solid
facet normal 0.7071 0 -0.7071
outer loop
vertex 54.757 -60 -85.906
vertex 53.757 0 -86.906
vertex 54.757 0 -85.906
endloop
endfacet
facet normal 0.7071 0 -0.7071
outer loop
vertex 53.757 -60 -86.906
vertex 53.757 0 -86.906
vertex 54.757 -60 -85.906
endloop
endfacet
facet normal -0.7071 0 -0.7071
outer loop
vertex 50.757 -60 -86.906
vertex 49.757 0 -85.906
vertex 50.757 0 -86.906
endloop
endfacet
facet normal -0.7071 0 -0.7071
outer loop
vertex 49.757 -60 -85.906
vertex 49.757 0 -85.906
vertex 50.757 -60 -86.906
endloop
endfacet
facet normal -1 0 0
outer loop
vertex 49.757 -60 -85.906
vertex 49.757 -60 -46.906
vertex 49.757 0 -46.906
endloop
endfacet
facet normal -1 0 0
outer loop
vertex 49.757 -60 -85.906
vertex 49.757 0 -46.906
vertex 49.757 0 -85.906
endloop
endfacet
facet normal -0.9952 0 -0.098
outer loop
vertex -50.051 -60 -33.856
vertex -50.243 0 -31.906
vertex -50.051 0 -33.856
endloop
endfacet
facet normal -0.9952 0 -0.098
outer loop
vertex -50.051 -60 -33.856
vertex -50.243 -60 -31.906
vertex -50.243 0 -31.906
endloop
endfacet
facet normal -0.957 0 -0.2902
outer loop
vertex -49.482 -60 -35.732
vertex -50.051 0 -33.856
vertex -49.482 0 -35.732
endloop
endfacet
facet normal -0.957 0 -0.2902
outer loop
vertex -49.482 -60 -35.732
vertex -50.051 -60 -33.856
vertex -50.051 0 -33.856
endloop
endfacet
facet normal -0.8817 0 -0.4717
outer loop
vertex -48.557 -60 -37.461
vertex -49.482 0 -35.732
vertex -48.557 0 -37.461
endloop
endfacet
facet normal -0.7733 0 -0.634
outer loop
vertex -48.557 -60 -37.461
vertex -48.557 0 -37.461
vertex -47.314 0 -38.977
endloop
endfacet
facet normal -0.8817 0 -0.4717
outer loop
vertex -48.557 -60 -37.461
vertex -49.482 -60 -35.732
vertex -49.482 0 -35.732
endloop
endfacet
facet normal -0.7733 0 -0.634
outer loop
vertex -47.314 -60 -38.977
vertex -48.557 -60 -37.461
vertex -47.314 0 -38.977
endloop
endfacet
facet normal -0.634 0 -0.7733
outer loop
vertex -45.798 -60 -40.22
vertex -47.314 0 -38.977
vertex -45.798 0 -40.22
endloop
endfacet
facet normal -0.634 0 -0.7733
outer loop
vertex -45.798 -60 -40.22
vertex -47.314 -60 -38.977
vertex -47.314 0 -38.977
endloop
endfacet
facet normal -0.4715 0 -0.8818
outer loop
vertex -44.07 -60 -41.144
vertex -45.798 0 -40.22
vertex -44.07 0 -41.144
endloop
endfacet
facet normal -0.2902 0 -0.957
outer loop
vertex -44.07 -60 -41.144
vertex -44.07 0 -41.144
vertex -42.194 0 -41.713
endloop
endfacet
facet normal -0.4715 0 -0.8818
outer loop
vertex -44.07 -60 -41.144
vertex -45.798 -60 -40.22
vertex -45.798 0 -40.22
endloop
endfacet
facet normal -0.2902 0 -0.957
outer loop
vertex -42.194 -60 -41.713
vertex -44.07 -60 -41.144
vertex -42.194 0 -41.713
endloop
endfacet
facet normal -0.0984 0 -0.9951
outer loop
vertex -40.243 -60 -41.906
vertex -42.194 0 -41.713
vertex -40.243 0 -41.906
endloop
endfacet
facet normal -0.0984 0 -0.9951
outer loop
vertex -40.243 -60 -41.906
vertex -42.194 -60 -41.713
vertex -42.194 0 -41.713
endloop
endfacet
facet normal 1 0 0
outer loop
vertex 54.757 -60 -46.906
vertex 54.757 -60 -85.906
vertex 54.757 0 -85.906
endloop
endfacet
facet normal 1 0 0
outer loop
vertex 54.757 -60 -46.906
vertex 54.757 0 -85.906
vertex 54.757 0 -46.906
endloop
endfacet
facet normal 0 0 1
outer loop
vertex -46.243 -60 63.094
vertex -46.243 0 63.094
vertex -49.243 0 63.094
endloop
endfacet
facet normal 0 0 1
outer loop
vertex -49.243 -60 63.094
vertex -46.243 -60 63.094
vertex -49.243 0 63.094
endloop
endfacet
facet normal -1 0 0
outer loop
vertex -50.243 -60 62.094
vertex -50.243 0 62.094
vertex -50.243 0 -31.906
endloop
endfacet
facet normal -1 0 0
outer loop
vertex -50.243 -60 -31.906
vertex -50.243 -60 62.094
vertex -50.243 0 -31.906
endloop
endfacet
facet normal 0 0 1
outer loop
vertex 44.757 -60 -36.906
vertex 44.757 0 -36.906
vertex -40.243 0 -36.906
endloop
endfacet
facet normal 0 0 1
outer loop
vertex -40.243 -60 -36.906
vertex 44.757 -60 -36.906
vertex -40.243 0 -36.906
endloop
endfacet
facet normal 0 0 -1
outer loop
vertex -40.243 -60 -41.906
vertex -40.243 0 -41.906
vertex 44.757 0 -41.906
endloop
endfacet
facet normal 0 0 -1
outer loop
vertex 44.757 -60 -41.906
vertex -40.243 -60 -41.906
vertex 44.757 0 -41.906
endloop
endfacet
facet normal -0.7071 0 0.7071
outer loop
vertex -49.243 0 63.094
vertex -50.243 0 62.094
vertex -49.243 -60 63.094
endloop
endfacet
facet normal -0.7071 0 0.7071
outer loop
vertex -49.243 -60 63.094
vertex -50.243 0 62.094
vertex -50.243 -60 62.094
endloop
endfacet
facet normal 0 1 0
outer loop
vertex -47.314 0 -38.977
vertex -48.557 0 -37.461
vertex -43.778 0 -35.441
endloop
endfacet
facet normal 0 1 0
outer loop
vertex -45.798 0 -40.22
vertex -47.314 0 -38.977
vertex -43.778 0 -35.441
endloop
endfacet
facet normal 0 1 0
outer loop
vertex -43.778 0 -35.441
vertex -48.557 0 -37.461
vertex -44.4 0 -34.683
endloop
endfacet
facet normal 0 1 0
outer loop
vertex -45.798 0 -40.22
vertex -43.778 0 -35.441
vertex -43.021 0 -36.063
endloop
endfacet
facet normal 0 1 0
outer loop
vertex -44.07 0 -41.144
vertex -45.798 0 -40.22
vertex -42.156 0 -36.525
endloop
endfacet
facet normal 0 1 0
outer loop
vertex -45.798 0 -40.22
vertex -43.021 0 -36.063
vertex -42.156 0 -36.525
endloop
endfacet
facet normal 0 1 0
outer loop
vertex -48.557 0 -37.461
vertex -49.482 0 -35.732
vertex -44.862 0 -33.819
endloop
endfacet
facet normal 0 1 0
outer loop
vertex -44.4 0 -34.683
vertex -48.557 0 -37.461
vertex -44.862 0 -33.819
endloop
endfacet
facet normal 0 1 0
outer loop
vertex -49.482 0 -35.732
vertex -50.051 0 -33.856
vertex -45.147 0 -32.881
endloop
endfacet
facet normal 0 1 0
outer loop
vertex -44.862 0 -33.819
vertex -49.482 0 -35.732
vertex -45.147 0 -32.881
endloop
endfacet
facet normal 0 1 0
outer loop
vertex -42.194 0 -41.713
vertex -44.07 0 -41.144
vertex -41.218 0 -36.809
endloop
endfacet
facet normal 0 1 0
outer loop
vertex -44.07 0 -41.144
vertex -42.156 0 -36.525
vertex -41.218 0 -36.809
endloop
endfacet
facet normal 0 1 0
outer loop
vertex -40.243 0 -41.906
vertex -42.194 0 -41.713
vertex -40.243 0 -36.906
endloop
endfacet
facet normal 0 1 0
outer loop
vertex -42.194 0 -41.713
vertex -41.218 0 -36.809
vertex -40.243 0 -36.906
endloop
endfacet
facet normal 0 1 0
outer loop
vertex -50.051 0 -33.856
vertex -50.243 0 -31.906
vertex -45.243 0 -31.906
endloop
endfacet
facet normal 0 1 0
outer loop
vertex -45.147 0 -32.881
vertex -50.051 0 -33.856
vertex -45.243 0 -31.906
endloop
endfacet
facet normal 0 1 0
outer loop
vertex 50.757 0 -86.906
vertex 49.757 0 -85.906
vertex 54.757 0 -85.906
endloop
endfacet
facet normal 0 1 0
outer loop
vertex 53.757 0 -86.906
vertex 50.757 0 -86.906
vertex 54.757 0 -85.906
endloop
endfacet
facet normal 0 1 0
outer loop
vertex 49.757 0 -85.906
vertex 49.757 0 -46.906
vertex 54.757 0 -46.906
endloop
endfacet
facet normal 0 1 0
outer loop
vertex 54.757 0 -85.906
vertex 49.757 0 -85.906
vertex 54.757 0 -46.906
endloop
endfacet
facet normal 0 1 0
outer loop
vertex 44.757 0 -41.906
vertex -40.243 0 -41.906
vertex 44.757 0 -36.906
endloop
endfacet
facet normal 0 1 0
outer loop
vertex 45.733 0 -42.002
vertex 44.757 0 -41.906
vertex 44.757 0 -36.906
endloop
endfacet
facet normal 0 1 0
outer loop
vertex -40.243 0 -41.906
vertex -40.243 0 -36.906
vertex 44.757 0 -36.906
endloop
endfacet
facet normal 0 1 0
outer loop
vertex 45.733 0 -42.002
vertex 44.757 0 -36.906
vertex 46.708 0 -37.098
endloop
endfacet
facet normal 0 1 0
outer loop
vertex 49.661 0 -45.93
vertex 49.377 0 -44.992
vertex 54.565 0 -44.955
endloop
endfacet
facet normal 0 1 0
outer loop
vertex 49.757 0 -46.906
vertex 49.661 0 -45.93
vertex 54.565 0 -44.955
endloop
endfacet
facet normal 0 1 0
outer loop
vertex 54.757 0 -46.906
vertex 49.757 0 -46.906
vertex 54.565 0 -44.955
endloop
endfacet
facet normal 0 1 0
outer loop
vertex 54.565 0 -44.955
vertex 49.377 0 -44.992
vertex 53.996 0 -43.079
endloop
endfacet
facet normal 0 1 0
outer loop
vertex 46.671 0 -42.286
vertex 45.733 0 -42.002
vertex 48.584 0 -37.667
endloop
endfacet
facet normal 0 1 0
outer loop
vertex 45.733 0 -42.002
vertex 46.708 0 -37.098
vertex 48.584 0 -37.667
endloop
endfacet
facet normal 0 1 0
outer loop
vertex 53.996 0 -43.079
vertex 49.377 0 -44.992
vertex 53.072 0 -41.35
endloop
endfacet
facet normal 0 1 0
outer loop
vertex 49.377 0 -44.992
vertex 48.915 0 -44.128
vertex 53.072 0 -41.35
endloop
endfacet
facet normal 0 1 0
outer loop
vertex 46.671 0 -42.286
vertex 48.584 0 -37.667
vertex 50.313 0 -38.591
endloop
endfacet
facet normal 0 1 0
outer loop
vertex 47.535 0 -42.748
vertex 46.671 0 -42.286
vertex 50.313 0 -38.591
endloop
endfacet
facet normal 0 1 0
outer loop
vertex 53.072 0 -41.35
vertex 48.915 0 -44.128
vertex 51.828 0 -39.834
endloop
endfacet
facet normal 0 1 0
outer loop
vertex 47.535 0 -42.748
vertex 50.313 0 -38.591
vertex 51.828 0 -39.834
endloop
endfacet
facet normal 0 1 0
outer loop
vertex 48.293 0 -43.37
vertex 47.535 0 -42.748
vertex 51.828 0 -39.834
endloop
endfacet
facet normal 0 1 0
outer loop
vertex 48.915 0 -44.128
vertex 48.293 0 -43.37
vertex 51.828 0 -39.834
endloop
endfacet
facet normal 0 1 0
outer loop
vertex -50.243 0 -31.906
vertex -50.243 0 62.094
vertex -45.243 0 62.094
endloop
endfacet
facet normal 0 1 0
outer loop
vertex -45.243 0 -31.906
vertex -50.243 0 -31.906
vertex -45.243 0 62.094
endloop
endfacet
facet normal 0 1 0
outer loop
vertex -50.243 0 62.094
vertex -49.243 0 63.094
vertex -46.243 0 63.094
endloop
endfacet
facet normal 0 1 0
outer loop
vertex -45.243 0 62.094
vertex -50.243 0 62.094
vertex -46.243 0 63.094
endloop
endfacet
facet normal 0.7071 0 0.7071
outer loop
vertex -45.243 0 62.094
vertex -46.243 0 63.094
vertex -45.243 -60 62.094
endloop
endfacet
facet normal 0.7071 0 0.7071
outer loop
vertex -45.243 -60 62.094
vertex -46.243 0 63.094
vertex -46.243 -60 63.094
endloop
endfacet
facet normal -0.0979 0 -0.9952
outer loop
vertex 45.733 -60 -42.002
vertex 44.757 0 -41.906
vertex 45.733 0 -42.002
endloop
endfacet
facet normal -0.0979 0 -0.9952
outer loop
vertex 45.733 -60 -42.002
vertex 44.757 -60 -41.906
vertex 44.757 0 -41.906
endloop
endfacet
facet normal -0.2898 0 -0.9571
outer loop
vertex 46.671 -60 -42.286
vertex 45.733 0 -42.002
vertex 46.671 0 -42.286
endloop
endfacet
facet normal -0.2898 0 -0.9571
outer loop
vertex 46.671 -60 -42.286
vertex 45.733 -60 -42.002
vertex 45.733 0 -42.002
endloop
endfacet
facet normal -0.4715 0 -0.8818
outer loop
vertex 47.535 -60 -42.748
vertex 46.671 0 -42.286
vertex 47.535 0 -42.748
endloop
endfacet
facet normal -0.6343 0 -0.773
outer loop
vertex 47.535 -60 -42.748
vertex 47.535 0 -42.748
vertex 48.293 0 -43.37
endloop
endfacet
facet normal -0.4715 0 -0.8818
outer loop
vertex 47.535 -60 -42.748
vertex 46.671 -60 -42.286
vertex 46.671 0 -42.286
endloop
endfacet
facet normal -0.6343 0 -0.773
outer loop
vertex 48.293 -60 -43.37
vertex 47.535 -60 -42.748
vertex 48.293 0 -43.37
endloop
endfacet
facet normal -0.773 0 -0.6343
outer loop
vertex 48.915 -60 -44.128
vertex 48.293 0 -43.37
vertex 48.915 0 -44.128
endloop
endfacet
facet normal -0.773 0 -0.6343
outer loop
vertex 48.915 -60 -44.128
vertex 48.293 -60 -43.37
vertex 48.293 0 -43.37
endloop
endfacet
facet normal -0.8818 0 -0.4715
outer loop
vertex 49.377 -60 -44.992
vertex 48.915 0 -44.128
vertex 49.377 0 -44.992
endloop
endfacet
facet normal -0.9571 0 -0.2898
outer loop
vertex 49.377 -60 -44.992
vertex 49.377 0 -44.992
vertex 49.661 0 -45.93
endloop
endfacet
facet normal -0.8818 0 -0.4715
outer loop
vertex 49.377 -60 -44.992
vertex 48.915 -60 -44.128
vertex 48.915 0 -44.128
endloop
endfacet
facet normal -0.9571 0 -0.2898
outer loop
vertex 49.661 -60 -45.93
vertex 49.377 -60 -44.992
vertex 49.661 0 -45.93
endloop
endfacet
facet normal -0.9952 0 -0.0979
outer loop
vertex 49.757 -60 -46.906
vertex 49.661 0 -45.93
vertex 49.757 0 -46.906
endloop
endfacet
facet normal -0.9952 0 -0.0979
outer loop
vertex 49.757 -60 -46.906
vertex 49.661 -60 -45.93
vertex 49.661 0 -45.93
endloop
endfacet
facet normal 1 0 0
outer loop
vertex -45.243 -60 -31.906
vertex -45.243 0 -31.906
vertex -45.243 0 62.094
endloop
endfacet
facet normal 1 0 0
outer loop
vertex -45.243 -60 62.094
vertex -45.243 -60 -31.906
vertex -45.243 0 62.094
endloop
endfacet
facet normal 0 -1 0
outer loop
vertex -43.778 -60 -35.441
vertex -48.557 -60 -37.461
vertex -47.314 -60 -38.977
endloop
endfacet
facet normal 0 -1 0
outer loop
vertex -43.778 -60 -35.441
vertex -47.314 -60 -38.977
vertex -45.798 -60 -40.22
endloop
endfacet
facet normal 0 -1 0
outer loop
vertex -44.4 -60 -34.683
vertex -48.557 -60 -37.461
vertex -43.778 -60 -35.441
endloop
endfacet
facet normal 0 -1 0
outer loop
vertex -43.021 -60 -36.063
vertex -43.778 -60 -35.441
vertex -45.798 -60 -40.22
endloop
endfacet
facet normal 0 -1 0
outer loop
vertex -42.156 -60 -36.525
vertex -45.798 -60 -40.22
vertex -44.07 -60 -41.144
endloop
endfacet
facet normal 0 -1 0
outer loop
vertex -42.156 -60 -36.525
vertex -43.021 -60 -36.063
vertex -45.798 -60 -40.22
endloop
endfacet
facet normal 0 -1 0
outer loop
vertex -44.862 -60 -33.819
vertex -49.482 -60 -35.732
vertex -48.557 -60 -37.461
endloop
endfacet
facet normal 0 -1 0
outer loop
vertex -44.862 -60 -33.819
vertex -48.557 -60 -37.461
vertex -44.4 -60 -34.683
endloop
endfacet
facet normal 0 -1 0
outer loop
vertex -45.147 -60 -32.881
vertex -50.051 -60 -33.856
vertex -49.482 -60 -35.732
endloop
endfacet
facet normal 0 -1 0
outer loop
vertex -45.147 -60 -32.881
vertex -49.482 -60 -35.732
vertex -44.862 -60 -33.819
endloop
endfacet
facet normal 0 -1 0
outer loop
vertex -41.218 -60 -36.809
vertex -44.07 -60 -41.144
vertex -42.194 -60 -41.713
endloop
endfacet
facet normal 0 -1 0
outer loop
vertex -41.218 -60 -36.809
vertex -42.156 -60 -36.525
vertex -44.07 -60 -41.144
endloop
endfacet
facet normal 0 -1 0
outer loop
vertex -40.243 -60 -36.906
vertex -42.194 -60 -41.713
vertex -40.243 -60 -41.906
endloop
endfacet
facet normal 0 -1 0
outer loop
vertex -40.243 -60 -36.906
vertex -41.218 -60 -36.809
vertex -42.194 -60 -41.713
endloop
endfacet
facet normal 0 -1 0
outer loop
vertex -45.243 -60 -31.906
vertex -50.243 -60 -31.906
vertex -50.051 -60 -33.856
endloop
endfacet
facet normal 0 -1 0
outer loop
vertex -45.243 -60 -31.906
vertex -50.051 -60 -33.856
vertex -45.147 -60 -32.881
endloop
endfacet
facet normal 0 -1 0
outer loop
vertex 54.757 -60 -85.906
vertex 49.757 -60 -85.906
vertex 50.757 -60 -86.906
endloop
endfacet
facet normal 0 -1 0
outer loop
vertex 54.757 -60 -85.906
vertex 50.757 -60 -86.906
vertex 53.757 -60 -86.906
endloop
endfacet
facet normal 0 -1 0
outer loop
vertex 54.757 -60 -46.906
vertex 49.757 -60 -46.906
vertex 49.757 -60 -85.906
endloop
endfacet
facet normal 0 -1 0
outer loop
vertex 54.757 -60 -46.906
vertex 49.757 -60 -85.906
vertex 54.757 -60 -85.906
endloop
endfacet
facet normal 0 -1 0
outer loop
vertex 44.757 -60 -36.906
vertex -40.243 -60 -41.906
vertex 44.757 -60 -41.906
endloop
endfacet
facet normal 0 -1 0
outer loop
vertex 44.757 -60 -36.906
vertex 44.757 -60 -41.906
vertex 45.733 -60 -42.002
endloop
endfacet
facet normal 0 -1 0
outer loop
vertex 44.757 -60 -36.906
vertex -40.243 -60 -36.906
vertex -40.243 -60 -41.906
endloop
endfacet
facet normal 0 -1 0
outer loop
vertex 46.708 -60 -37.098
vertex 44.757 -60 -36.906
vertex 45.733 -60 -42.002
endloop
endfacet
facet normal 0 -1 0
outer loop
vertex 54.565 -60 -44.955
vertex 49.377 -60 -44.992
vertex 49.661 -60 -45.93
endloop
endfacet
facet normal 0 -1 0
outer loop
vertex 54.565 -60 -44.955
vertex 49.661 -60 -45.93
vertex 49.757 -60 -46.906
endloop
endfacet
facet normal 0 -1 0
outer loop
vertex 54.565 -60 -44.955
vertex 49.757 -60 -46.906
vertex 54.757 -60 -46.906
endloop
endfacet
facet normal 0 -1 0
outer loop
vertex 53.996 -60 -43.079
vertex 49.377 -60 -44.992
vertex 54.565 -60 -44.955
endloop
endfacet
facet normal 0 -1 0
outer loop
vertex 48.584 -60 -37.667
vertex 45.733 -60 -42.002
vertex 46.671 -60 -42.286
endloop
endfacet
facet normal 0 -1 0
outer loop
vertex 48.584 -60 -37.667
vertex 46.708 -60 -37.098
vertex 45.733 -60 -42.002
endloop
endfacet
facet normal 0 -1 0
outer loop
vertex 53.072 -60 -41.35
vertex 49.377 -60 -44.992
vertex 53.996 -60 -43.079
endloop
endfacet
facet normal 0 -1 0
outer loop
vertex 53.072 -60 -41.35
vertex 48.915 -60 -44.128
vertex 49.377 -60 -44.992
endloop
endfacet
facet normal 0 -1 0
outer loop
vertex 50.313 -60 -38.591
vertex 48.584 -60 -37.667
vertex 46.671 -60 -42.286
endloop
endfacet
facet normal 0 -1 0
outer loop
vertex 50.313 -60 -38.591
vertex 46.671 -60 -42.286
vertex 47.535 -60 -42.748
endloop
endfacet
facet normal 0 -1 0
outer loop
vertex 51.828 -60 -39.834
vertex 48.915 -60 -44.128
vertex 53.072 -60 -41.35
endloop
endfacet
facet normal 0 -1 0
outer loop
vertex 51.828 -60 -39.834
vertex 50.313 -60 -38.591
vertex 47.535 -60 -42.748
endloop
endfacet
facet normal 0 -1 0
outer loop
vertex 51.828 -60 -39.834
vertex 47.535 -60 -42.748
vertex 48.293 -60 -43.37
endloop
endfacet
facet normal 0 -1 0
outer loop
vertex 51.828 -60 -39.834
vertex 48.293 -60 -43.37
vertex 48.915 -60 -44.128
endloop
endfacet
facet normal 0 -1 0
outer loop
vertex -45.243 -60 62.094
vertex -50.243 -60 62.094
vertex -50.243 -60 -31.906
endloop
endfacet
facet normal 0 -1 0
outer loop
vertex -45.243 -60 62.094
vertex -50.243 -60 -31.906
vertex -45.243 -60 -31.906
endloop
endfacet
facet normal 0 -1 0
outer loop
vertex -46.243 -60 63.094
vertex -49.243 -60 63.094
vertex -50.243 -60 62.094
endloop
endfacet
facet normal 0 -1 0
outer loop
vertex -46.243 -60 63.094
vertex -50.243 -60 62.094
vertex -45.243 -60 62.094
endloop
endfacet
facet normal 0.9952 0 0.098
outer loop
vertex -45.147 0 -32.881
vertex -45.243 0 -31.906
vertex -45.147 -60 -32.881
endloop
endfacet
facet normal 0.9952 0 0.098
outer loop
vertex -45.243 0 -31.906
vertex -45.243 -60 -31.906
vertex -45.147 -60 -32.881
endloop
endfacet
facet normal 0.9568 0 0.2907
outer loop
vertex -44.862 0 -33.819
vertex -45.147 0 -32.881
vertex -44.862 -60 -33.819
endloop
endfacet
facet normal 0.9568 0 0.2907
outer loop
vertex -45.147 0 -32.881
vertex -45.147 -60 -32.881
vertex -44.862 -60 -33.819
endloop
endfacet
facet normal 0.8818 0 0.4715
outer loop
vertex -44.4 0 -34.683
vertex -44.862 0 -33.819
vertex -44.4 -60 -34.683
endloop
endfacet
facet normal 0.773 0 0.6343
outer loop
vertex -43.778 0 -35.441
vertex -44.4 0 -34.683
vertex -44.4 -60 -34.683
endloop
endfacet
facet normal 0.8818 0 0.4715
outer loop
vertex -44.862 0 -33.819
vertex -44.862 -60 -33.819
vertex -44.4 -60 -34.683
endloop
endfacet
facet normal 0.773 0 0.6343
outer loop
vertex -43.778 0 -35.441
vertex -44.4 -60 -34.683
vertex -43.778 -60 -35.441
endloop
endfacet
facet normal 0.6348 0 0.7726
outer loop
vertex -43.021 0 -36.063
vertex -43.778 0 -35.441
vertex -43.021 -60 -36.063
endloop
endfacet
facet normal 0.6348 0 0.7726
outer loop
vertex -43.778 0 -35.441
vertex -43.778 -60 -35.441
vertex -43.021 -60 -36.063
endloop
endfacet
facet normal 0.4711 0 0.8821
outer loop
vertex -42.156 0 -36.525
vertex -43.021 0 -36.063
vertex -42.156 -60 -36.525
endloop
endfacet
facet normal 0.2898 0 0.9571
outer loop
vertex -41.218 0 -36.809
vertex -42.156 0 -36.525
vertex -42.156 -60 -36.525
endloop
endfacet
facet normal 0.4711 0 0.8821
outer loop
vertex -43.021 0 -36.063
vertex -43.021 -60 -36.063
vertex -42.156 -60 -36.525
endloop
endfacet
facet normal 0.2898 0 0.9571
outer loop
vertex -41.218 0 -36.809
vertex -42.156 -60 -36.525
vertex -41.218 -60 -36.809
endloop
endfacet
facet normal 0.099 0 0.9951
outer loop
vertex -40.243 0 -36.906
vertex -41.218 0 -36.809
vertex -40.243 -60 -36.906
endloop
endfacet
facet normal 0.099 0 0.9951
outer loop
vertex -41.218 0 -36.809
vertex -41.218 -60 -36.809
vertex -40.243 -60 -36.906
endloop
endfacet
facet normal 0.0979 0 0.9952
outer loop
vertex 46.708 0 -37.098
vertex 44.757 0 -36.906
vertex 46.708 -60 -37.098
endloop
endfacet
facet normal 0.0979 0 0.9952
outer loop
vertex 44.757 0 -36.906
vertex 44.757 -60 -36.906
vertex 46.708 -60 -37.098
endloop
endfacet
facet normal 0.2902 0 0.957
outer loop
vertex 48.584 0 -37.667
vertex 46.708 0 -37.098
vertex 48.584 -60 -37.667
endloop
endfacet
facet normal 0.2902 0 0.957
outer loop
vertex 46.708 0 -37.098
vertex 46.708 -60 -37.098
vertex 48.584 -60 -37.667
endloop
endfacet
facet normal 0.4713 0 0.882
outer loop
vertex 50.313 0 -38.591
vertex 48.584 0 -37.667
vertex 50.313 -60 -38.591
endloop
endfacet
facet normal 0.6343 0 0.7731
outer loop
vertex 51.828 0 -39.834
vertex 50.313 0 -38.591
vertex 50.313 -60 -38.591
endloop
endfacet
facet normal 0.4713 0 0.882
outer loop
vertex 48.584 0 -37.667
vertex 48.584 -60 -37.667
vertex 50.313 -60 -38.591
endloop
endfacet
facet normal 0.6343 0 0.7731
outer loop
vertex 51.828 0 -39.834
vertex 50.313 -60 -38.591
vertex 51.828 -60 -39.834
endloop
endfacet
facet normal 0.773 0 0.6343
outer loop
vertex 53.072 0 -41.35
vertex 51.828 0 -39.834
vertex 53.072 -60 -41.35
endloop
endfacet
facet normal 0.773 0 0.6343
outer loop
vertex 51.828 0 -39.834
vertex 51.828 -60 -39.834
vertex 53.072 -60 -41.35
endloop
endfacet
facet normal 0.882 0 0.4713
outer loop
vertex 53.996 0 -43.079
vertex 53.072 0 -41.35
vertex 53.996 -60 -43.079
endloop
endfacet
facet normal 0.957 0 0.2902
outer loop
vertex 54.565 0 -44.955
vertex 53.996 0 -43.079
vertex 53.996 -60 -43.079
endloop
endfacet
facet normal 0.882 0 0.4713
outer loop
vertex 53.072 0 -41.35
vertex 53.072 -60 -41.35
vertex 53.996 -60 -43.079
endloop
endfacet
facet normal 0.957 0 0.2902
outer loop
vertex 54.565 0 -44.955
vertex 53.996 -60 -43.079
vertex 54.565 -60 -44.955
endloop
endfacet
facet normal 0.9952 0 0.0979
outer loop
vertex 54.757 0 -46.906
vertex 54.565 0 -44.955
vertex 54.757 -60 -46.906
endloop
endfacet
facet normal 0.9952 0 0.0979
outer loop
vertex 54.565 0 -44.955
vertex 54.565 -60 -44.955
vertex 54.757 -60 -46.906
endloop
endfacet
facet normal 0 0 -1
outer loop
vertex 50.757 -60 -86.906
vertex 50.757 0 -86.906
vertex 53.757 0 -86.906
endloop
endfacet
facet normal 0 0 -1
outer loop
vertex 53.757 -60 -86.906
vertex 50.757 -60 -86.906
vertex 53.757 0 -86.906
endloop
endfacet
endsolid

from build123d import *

# Parameters (mm, degrees)
F1_DEPTH = 60
F2_R     = 5
F3_R     = 10
F4_SIZE  = 1


with BuildPart() as f1:
    # F0 (on Front) → F1 (new body)
    with BuildSketch(Plane.XZ):
        Polygon((-45.242744, -36.905519), (-45.242744, 63.094481), (-50.242744, 63.094481), (-50.242744, -41.905519), (49.757256, -41.905519), (49.757256, -86.905519), (54.757256, -86.905519), (54.757256, -36.905519), align=None)
    extrude(amount=F1_DEPTH)

    # F2
    f2_edges = [f1.edges().sort_by_distance(p)[0] for p in [
        (-45.242744, -30, -36.905519),
        (49.757256, -30, -41.905519),
    ]]
    fillet(f2_edges, radius=F2_R)

    # F3
    f3_edges = [f1.edges().sort_by_distance(p)[0] for p in [
        (54.757256, -30, -36.905519),
        (-50.242744, -30, -41.905519),
    ]]
    fillet(f3_edges, radius=F3_R)

    # F4
    f4_edges = [f1.edges().sort_by_distance(p)[0] for p in [
        (-45.242744, -30, 63.094481),
        (-50.242744, -30, 63.094481),
        (54.757256, -30, -86.905519),
        (49.757256, -30, -86.905519),
    ]]
    chamfer(f4_edges, length=F4_SIZE)


solid = f1.part
